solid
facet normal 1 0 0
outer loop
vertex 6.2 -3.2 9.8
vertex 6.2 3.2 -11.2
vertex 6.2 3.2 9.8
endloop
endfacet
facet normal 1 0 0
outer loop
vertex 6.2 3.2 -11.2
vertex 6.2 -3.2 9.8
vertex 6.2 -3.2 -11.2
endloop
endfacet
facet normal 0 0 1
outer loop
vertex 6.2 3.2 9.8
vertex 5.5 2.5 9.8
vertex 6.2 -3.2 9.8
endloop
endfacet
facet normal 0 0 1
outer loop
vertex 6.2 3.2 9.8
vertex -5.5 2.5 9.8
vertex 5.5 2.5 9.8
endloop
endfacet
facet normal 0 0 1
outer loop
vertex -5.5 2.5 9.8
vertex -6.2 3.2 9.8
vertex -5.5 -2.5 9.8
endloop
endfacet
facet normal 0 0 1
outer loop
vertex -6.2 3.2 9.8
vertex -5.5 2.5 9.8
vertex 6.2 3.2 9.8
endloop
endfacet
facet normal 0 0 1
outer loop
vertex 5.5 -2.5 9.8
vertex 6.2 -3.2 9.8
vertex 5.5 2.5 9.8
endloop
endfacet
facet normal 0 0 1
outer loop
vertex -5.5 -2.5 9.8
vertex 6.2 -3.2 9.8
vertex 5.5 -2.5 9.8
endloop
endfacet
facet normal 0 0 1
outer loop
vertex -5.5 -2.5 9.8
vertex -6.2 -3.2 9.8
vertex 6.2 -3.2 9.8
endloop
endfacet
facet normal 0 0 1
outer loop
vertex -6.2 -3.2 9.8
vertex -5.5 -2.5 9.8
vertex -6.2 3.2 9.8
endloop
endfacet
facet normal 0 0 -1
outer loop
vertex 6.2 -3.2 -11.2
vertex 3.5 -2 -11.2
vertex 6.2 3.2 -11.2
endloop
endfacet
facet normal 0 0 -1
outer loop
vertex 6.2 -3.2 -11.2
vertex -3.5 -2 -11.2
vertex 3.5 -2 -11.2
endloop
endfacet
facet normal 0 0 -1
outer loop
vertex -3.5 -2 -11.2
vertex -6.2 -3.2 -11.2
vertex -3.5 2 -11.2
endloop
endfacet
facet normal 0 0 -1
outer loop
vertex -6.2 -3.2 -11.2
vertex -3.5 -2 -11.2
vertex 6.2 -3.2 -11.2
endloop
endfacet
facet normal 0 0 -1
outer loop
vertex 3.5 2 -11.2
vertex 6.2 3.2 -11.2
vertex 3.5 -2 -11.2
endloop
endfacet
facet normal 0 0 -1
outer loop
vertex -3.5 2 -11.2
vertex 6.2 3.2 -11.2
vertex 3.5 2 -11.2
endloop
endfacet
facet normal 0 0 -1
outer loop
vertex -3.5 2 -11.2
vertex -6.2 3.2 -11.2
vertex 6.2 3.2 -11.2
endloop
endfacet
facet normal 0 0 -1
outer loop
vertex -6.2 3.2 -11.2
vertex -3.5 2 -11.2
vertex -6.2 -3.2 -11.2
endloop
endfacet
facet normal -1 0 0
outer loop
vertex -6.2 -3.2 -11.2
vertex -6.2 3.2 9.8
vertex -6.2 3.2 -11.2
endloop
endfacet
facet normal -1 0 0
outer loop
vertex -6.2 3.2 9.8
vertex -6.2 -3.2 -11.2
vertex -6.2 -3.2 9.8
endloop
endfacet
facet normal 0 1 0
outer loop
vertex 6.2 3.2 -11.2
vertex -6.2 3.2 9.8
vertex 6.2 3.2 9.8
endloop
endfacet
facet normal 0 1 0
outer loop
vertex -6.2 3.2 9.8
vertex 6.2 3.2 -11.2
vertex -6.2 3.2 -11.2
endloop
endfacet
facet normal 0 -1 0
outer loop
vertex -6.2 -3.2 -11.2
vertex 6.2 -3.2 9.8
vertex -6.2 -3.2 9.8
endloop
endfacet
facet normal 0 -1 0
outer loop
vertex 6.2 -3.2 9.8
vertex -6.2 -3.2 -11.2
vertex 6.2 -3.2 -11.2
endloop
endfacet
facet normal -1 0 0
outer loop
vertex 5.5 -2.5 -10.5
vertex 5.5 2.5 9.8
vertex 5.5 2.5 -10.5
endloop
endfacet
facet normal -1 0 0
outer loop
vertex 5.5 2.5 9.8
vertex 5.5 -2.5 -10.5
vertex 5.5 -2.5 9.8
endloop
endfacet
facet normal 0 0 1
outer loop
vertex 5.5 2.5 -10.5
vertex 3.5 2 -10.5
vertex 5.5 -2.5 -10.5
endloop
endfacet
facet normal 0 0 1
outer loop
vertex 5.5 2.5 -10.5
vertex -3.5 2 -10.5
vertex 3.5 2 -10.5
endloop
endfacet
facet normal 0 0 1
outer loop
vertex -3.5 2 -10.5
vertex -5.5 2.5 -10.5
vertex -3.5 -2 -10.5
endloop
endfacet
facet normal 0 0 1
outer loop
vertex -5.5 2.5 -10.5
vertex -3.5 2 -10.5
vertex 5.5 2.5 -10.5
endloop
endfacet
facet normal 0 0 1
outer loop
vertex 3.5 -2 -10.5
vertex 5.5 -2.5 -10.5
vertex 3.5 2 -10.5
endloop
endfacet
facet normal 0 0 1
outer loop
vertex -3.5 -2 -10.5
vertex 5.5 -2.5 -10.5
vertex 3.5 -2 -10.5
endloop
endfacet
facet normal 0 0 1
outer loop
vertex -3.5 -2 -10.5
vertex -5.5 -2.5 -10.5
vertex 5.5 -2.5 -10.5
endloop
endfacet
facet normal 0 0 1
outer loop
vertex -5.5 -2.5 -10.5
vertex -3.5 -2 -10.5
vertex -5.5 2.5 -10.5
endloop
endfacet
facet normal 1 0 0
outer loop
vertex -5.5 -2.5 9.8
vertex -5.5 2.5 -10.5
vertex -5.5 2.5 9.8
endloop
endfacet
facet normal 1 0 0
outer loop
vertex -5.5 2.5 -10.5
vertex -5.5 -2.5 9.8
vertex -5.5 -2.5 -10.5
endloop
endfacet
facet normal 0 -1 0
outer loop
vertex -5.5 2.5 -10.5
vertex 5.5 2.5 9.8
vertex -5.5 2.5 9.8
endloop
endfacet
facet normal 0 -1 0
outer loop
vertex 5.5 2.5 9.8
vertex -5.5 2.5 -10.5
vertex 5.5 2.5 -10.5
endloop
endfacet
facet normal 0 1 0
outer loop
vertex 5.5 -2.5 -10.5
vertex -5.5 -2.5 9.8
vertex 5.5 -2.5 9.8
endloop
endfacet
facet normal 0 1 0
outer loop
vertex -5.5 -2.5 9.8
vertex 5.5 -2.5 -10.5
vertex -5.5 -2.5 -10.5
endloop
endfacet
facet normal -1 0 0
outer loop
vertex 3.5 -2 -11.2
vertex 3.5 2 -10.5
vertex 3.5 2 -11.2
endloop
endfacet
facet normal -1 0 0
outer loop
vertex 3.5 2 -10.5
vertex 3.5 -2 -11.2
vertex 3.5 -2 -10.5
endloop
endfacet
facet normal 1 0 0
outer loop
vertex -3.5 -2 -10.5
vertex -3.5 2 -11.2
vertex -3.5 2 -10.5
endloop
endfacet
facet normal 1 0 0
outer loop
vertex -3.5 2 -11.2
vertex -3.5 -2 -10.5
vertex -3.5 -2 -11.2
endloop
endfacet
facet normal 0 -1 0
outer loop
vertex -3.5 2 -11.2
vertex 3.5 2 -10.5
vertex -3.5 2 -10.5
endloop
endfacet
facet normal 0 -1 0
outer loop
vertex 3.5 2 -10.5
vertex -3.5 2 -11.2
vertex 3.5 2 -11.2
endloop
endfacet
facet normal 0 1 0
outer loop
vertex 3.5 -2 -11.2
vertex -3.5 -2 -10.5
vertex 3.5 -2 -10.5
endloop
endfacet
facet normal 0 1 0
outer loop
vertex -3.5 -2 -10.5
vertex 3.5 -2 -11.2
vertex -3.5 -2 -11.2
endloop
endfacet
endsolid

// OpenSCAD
/**
 *    NPN_cover
 * 
 *    @author         Karel Fiala
 *    @email          fiala.karel@gmail.com
 */

$fn=200;

module NPN_cover() {

    // code
    npn_width = 11;
    npn_thick = 5;
    npn_height = 28 - 7;
    wall_thick = 0.7;
    
    difference() {
        translate([0, 0, -wall_thick])
            cube([npn_width + 2*wall_thick, npn_thick + 2*wall_thick, npn_height], center = true);
        cube([npn_width, npn_thick, npn_height], center = true);
        
        translate([0, 0, -npn_height/2 - wall_thick])
            cube([7, 4, wall_thick*2], center = true);
    }

}


// calling
NPN_cover();
